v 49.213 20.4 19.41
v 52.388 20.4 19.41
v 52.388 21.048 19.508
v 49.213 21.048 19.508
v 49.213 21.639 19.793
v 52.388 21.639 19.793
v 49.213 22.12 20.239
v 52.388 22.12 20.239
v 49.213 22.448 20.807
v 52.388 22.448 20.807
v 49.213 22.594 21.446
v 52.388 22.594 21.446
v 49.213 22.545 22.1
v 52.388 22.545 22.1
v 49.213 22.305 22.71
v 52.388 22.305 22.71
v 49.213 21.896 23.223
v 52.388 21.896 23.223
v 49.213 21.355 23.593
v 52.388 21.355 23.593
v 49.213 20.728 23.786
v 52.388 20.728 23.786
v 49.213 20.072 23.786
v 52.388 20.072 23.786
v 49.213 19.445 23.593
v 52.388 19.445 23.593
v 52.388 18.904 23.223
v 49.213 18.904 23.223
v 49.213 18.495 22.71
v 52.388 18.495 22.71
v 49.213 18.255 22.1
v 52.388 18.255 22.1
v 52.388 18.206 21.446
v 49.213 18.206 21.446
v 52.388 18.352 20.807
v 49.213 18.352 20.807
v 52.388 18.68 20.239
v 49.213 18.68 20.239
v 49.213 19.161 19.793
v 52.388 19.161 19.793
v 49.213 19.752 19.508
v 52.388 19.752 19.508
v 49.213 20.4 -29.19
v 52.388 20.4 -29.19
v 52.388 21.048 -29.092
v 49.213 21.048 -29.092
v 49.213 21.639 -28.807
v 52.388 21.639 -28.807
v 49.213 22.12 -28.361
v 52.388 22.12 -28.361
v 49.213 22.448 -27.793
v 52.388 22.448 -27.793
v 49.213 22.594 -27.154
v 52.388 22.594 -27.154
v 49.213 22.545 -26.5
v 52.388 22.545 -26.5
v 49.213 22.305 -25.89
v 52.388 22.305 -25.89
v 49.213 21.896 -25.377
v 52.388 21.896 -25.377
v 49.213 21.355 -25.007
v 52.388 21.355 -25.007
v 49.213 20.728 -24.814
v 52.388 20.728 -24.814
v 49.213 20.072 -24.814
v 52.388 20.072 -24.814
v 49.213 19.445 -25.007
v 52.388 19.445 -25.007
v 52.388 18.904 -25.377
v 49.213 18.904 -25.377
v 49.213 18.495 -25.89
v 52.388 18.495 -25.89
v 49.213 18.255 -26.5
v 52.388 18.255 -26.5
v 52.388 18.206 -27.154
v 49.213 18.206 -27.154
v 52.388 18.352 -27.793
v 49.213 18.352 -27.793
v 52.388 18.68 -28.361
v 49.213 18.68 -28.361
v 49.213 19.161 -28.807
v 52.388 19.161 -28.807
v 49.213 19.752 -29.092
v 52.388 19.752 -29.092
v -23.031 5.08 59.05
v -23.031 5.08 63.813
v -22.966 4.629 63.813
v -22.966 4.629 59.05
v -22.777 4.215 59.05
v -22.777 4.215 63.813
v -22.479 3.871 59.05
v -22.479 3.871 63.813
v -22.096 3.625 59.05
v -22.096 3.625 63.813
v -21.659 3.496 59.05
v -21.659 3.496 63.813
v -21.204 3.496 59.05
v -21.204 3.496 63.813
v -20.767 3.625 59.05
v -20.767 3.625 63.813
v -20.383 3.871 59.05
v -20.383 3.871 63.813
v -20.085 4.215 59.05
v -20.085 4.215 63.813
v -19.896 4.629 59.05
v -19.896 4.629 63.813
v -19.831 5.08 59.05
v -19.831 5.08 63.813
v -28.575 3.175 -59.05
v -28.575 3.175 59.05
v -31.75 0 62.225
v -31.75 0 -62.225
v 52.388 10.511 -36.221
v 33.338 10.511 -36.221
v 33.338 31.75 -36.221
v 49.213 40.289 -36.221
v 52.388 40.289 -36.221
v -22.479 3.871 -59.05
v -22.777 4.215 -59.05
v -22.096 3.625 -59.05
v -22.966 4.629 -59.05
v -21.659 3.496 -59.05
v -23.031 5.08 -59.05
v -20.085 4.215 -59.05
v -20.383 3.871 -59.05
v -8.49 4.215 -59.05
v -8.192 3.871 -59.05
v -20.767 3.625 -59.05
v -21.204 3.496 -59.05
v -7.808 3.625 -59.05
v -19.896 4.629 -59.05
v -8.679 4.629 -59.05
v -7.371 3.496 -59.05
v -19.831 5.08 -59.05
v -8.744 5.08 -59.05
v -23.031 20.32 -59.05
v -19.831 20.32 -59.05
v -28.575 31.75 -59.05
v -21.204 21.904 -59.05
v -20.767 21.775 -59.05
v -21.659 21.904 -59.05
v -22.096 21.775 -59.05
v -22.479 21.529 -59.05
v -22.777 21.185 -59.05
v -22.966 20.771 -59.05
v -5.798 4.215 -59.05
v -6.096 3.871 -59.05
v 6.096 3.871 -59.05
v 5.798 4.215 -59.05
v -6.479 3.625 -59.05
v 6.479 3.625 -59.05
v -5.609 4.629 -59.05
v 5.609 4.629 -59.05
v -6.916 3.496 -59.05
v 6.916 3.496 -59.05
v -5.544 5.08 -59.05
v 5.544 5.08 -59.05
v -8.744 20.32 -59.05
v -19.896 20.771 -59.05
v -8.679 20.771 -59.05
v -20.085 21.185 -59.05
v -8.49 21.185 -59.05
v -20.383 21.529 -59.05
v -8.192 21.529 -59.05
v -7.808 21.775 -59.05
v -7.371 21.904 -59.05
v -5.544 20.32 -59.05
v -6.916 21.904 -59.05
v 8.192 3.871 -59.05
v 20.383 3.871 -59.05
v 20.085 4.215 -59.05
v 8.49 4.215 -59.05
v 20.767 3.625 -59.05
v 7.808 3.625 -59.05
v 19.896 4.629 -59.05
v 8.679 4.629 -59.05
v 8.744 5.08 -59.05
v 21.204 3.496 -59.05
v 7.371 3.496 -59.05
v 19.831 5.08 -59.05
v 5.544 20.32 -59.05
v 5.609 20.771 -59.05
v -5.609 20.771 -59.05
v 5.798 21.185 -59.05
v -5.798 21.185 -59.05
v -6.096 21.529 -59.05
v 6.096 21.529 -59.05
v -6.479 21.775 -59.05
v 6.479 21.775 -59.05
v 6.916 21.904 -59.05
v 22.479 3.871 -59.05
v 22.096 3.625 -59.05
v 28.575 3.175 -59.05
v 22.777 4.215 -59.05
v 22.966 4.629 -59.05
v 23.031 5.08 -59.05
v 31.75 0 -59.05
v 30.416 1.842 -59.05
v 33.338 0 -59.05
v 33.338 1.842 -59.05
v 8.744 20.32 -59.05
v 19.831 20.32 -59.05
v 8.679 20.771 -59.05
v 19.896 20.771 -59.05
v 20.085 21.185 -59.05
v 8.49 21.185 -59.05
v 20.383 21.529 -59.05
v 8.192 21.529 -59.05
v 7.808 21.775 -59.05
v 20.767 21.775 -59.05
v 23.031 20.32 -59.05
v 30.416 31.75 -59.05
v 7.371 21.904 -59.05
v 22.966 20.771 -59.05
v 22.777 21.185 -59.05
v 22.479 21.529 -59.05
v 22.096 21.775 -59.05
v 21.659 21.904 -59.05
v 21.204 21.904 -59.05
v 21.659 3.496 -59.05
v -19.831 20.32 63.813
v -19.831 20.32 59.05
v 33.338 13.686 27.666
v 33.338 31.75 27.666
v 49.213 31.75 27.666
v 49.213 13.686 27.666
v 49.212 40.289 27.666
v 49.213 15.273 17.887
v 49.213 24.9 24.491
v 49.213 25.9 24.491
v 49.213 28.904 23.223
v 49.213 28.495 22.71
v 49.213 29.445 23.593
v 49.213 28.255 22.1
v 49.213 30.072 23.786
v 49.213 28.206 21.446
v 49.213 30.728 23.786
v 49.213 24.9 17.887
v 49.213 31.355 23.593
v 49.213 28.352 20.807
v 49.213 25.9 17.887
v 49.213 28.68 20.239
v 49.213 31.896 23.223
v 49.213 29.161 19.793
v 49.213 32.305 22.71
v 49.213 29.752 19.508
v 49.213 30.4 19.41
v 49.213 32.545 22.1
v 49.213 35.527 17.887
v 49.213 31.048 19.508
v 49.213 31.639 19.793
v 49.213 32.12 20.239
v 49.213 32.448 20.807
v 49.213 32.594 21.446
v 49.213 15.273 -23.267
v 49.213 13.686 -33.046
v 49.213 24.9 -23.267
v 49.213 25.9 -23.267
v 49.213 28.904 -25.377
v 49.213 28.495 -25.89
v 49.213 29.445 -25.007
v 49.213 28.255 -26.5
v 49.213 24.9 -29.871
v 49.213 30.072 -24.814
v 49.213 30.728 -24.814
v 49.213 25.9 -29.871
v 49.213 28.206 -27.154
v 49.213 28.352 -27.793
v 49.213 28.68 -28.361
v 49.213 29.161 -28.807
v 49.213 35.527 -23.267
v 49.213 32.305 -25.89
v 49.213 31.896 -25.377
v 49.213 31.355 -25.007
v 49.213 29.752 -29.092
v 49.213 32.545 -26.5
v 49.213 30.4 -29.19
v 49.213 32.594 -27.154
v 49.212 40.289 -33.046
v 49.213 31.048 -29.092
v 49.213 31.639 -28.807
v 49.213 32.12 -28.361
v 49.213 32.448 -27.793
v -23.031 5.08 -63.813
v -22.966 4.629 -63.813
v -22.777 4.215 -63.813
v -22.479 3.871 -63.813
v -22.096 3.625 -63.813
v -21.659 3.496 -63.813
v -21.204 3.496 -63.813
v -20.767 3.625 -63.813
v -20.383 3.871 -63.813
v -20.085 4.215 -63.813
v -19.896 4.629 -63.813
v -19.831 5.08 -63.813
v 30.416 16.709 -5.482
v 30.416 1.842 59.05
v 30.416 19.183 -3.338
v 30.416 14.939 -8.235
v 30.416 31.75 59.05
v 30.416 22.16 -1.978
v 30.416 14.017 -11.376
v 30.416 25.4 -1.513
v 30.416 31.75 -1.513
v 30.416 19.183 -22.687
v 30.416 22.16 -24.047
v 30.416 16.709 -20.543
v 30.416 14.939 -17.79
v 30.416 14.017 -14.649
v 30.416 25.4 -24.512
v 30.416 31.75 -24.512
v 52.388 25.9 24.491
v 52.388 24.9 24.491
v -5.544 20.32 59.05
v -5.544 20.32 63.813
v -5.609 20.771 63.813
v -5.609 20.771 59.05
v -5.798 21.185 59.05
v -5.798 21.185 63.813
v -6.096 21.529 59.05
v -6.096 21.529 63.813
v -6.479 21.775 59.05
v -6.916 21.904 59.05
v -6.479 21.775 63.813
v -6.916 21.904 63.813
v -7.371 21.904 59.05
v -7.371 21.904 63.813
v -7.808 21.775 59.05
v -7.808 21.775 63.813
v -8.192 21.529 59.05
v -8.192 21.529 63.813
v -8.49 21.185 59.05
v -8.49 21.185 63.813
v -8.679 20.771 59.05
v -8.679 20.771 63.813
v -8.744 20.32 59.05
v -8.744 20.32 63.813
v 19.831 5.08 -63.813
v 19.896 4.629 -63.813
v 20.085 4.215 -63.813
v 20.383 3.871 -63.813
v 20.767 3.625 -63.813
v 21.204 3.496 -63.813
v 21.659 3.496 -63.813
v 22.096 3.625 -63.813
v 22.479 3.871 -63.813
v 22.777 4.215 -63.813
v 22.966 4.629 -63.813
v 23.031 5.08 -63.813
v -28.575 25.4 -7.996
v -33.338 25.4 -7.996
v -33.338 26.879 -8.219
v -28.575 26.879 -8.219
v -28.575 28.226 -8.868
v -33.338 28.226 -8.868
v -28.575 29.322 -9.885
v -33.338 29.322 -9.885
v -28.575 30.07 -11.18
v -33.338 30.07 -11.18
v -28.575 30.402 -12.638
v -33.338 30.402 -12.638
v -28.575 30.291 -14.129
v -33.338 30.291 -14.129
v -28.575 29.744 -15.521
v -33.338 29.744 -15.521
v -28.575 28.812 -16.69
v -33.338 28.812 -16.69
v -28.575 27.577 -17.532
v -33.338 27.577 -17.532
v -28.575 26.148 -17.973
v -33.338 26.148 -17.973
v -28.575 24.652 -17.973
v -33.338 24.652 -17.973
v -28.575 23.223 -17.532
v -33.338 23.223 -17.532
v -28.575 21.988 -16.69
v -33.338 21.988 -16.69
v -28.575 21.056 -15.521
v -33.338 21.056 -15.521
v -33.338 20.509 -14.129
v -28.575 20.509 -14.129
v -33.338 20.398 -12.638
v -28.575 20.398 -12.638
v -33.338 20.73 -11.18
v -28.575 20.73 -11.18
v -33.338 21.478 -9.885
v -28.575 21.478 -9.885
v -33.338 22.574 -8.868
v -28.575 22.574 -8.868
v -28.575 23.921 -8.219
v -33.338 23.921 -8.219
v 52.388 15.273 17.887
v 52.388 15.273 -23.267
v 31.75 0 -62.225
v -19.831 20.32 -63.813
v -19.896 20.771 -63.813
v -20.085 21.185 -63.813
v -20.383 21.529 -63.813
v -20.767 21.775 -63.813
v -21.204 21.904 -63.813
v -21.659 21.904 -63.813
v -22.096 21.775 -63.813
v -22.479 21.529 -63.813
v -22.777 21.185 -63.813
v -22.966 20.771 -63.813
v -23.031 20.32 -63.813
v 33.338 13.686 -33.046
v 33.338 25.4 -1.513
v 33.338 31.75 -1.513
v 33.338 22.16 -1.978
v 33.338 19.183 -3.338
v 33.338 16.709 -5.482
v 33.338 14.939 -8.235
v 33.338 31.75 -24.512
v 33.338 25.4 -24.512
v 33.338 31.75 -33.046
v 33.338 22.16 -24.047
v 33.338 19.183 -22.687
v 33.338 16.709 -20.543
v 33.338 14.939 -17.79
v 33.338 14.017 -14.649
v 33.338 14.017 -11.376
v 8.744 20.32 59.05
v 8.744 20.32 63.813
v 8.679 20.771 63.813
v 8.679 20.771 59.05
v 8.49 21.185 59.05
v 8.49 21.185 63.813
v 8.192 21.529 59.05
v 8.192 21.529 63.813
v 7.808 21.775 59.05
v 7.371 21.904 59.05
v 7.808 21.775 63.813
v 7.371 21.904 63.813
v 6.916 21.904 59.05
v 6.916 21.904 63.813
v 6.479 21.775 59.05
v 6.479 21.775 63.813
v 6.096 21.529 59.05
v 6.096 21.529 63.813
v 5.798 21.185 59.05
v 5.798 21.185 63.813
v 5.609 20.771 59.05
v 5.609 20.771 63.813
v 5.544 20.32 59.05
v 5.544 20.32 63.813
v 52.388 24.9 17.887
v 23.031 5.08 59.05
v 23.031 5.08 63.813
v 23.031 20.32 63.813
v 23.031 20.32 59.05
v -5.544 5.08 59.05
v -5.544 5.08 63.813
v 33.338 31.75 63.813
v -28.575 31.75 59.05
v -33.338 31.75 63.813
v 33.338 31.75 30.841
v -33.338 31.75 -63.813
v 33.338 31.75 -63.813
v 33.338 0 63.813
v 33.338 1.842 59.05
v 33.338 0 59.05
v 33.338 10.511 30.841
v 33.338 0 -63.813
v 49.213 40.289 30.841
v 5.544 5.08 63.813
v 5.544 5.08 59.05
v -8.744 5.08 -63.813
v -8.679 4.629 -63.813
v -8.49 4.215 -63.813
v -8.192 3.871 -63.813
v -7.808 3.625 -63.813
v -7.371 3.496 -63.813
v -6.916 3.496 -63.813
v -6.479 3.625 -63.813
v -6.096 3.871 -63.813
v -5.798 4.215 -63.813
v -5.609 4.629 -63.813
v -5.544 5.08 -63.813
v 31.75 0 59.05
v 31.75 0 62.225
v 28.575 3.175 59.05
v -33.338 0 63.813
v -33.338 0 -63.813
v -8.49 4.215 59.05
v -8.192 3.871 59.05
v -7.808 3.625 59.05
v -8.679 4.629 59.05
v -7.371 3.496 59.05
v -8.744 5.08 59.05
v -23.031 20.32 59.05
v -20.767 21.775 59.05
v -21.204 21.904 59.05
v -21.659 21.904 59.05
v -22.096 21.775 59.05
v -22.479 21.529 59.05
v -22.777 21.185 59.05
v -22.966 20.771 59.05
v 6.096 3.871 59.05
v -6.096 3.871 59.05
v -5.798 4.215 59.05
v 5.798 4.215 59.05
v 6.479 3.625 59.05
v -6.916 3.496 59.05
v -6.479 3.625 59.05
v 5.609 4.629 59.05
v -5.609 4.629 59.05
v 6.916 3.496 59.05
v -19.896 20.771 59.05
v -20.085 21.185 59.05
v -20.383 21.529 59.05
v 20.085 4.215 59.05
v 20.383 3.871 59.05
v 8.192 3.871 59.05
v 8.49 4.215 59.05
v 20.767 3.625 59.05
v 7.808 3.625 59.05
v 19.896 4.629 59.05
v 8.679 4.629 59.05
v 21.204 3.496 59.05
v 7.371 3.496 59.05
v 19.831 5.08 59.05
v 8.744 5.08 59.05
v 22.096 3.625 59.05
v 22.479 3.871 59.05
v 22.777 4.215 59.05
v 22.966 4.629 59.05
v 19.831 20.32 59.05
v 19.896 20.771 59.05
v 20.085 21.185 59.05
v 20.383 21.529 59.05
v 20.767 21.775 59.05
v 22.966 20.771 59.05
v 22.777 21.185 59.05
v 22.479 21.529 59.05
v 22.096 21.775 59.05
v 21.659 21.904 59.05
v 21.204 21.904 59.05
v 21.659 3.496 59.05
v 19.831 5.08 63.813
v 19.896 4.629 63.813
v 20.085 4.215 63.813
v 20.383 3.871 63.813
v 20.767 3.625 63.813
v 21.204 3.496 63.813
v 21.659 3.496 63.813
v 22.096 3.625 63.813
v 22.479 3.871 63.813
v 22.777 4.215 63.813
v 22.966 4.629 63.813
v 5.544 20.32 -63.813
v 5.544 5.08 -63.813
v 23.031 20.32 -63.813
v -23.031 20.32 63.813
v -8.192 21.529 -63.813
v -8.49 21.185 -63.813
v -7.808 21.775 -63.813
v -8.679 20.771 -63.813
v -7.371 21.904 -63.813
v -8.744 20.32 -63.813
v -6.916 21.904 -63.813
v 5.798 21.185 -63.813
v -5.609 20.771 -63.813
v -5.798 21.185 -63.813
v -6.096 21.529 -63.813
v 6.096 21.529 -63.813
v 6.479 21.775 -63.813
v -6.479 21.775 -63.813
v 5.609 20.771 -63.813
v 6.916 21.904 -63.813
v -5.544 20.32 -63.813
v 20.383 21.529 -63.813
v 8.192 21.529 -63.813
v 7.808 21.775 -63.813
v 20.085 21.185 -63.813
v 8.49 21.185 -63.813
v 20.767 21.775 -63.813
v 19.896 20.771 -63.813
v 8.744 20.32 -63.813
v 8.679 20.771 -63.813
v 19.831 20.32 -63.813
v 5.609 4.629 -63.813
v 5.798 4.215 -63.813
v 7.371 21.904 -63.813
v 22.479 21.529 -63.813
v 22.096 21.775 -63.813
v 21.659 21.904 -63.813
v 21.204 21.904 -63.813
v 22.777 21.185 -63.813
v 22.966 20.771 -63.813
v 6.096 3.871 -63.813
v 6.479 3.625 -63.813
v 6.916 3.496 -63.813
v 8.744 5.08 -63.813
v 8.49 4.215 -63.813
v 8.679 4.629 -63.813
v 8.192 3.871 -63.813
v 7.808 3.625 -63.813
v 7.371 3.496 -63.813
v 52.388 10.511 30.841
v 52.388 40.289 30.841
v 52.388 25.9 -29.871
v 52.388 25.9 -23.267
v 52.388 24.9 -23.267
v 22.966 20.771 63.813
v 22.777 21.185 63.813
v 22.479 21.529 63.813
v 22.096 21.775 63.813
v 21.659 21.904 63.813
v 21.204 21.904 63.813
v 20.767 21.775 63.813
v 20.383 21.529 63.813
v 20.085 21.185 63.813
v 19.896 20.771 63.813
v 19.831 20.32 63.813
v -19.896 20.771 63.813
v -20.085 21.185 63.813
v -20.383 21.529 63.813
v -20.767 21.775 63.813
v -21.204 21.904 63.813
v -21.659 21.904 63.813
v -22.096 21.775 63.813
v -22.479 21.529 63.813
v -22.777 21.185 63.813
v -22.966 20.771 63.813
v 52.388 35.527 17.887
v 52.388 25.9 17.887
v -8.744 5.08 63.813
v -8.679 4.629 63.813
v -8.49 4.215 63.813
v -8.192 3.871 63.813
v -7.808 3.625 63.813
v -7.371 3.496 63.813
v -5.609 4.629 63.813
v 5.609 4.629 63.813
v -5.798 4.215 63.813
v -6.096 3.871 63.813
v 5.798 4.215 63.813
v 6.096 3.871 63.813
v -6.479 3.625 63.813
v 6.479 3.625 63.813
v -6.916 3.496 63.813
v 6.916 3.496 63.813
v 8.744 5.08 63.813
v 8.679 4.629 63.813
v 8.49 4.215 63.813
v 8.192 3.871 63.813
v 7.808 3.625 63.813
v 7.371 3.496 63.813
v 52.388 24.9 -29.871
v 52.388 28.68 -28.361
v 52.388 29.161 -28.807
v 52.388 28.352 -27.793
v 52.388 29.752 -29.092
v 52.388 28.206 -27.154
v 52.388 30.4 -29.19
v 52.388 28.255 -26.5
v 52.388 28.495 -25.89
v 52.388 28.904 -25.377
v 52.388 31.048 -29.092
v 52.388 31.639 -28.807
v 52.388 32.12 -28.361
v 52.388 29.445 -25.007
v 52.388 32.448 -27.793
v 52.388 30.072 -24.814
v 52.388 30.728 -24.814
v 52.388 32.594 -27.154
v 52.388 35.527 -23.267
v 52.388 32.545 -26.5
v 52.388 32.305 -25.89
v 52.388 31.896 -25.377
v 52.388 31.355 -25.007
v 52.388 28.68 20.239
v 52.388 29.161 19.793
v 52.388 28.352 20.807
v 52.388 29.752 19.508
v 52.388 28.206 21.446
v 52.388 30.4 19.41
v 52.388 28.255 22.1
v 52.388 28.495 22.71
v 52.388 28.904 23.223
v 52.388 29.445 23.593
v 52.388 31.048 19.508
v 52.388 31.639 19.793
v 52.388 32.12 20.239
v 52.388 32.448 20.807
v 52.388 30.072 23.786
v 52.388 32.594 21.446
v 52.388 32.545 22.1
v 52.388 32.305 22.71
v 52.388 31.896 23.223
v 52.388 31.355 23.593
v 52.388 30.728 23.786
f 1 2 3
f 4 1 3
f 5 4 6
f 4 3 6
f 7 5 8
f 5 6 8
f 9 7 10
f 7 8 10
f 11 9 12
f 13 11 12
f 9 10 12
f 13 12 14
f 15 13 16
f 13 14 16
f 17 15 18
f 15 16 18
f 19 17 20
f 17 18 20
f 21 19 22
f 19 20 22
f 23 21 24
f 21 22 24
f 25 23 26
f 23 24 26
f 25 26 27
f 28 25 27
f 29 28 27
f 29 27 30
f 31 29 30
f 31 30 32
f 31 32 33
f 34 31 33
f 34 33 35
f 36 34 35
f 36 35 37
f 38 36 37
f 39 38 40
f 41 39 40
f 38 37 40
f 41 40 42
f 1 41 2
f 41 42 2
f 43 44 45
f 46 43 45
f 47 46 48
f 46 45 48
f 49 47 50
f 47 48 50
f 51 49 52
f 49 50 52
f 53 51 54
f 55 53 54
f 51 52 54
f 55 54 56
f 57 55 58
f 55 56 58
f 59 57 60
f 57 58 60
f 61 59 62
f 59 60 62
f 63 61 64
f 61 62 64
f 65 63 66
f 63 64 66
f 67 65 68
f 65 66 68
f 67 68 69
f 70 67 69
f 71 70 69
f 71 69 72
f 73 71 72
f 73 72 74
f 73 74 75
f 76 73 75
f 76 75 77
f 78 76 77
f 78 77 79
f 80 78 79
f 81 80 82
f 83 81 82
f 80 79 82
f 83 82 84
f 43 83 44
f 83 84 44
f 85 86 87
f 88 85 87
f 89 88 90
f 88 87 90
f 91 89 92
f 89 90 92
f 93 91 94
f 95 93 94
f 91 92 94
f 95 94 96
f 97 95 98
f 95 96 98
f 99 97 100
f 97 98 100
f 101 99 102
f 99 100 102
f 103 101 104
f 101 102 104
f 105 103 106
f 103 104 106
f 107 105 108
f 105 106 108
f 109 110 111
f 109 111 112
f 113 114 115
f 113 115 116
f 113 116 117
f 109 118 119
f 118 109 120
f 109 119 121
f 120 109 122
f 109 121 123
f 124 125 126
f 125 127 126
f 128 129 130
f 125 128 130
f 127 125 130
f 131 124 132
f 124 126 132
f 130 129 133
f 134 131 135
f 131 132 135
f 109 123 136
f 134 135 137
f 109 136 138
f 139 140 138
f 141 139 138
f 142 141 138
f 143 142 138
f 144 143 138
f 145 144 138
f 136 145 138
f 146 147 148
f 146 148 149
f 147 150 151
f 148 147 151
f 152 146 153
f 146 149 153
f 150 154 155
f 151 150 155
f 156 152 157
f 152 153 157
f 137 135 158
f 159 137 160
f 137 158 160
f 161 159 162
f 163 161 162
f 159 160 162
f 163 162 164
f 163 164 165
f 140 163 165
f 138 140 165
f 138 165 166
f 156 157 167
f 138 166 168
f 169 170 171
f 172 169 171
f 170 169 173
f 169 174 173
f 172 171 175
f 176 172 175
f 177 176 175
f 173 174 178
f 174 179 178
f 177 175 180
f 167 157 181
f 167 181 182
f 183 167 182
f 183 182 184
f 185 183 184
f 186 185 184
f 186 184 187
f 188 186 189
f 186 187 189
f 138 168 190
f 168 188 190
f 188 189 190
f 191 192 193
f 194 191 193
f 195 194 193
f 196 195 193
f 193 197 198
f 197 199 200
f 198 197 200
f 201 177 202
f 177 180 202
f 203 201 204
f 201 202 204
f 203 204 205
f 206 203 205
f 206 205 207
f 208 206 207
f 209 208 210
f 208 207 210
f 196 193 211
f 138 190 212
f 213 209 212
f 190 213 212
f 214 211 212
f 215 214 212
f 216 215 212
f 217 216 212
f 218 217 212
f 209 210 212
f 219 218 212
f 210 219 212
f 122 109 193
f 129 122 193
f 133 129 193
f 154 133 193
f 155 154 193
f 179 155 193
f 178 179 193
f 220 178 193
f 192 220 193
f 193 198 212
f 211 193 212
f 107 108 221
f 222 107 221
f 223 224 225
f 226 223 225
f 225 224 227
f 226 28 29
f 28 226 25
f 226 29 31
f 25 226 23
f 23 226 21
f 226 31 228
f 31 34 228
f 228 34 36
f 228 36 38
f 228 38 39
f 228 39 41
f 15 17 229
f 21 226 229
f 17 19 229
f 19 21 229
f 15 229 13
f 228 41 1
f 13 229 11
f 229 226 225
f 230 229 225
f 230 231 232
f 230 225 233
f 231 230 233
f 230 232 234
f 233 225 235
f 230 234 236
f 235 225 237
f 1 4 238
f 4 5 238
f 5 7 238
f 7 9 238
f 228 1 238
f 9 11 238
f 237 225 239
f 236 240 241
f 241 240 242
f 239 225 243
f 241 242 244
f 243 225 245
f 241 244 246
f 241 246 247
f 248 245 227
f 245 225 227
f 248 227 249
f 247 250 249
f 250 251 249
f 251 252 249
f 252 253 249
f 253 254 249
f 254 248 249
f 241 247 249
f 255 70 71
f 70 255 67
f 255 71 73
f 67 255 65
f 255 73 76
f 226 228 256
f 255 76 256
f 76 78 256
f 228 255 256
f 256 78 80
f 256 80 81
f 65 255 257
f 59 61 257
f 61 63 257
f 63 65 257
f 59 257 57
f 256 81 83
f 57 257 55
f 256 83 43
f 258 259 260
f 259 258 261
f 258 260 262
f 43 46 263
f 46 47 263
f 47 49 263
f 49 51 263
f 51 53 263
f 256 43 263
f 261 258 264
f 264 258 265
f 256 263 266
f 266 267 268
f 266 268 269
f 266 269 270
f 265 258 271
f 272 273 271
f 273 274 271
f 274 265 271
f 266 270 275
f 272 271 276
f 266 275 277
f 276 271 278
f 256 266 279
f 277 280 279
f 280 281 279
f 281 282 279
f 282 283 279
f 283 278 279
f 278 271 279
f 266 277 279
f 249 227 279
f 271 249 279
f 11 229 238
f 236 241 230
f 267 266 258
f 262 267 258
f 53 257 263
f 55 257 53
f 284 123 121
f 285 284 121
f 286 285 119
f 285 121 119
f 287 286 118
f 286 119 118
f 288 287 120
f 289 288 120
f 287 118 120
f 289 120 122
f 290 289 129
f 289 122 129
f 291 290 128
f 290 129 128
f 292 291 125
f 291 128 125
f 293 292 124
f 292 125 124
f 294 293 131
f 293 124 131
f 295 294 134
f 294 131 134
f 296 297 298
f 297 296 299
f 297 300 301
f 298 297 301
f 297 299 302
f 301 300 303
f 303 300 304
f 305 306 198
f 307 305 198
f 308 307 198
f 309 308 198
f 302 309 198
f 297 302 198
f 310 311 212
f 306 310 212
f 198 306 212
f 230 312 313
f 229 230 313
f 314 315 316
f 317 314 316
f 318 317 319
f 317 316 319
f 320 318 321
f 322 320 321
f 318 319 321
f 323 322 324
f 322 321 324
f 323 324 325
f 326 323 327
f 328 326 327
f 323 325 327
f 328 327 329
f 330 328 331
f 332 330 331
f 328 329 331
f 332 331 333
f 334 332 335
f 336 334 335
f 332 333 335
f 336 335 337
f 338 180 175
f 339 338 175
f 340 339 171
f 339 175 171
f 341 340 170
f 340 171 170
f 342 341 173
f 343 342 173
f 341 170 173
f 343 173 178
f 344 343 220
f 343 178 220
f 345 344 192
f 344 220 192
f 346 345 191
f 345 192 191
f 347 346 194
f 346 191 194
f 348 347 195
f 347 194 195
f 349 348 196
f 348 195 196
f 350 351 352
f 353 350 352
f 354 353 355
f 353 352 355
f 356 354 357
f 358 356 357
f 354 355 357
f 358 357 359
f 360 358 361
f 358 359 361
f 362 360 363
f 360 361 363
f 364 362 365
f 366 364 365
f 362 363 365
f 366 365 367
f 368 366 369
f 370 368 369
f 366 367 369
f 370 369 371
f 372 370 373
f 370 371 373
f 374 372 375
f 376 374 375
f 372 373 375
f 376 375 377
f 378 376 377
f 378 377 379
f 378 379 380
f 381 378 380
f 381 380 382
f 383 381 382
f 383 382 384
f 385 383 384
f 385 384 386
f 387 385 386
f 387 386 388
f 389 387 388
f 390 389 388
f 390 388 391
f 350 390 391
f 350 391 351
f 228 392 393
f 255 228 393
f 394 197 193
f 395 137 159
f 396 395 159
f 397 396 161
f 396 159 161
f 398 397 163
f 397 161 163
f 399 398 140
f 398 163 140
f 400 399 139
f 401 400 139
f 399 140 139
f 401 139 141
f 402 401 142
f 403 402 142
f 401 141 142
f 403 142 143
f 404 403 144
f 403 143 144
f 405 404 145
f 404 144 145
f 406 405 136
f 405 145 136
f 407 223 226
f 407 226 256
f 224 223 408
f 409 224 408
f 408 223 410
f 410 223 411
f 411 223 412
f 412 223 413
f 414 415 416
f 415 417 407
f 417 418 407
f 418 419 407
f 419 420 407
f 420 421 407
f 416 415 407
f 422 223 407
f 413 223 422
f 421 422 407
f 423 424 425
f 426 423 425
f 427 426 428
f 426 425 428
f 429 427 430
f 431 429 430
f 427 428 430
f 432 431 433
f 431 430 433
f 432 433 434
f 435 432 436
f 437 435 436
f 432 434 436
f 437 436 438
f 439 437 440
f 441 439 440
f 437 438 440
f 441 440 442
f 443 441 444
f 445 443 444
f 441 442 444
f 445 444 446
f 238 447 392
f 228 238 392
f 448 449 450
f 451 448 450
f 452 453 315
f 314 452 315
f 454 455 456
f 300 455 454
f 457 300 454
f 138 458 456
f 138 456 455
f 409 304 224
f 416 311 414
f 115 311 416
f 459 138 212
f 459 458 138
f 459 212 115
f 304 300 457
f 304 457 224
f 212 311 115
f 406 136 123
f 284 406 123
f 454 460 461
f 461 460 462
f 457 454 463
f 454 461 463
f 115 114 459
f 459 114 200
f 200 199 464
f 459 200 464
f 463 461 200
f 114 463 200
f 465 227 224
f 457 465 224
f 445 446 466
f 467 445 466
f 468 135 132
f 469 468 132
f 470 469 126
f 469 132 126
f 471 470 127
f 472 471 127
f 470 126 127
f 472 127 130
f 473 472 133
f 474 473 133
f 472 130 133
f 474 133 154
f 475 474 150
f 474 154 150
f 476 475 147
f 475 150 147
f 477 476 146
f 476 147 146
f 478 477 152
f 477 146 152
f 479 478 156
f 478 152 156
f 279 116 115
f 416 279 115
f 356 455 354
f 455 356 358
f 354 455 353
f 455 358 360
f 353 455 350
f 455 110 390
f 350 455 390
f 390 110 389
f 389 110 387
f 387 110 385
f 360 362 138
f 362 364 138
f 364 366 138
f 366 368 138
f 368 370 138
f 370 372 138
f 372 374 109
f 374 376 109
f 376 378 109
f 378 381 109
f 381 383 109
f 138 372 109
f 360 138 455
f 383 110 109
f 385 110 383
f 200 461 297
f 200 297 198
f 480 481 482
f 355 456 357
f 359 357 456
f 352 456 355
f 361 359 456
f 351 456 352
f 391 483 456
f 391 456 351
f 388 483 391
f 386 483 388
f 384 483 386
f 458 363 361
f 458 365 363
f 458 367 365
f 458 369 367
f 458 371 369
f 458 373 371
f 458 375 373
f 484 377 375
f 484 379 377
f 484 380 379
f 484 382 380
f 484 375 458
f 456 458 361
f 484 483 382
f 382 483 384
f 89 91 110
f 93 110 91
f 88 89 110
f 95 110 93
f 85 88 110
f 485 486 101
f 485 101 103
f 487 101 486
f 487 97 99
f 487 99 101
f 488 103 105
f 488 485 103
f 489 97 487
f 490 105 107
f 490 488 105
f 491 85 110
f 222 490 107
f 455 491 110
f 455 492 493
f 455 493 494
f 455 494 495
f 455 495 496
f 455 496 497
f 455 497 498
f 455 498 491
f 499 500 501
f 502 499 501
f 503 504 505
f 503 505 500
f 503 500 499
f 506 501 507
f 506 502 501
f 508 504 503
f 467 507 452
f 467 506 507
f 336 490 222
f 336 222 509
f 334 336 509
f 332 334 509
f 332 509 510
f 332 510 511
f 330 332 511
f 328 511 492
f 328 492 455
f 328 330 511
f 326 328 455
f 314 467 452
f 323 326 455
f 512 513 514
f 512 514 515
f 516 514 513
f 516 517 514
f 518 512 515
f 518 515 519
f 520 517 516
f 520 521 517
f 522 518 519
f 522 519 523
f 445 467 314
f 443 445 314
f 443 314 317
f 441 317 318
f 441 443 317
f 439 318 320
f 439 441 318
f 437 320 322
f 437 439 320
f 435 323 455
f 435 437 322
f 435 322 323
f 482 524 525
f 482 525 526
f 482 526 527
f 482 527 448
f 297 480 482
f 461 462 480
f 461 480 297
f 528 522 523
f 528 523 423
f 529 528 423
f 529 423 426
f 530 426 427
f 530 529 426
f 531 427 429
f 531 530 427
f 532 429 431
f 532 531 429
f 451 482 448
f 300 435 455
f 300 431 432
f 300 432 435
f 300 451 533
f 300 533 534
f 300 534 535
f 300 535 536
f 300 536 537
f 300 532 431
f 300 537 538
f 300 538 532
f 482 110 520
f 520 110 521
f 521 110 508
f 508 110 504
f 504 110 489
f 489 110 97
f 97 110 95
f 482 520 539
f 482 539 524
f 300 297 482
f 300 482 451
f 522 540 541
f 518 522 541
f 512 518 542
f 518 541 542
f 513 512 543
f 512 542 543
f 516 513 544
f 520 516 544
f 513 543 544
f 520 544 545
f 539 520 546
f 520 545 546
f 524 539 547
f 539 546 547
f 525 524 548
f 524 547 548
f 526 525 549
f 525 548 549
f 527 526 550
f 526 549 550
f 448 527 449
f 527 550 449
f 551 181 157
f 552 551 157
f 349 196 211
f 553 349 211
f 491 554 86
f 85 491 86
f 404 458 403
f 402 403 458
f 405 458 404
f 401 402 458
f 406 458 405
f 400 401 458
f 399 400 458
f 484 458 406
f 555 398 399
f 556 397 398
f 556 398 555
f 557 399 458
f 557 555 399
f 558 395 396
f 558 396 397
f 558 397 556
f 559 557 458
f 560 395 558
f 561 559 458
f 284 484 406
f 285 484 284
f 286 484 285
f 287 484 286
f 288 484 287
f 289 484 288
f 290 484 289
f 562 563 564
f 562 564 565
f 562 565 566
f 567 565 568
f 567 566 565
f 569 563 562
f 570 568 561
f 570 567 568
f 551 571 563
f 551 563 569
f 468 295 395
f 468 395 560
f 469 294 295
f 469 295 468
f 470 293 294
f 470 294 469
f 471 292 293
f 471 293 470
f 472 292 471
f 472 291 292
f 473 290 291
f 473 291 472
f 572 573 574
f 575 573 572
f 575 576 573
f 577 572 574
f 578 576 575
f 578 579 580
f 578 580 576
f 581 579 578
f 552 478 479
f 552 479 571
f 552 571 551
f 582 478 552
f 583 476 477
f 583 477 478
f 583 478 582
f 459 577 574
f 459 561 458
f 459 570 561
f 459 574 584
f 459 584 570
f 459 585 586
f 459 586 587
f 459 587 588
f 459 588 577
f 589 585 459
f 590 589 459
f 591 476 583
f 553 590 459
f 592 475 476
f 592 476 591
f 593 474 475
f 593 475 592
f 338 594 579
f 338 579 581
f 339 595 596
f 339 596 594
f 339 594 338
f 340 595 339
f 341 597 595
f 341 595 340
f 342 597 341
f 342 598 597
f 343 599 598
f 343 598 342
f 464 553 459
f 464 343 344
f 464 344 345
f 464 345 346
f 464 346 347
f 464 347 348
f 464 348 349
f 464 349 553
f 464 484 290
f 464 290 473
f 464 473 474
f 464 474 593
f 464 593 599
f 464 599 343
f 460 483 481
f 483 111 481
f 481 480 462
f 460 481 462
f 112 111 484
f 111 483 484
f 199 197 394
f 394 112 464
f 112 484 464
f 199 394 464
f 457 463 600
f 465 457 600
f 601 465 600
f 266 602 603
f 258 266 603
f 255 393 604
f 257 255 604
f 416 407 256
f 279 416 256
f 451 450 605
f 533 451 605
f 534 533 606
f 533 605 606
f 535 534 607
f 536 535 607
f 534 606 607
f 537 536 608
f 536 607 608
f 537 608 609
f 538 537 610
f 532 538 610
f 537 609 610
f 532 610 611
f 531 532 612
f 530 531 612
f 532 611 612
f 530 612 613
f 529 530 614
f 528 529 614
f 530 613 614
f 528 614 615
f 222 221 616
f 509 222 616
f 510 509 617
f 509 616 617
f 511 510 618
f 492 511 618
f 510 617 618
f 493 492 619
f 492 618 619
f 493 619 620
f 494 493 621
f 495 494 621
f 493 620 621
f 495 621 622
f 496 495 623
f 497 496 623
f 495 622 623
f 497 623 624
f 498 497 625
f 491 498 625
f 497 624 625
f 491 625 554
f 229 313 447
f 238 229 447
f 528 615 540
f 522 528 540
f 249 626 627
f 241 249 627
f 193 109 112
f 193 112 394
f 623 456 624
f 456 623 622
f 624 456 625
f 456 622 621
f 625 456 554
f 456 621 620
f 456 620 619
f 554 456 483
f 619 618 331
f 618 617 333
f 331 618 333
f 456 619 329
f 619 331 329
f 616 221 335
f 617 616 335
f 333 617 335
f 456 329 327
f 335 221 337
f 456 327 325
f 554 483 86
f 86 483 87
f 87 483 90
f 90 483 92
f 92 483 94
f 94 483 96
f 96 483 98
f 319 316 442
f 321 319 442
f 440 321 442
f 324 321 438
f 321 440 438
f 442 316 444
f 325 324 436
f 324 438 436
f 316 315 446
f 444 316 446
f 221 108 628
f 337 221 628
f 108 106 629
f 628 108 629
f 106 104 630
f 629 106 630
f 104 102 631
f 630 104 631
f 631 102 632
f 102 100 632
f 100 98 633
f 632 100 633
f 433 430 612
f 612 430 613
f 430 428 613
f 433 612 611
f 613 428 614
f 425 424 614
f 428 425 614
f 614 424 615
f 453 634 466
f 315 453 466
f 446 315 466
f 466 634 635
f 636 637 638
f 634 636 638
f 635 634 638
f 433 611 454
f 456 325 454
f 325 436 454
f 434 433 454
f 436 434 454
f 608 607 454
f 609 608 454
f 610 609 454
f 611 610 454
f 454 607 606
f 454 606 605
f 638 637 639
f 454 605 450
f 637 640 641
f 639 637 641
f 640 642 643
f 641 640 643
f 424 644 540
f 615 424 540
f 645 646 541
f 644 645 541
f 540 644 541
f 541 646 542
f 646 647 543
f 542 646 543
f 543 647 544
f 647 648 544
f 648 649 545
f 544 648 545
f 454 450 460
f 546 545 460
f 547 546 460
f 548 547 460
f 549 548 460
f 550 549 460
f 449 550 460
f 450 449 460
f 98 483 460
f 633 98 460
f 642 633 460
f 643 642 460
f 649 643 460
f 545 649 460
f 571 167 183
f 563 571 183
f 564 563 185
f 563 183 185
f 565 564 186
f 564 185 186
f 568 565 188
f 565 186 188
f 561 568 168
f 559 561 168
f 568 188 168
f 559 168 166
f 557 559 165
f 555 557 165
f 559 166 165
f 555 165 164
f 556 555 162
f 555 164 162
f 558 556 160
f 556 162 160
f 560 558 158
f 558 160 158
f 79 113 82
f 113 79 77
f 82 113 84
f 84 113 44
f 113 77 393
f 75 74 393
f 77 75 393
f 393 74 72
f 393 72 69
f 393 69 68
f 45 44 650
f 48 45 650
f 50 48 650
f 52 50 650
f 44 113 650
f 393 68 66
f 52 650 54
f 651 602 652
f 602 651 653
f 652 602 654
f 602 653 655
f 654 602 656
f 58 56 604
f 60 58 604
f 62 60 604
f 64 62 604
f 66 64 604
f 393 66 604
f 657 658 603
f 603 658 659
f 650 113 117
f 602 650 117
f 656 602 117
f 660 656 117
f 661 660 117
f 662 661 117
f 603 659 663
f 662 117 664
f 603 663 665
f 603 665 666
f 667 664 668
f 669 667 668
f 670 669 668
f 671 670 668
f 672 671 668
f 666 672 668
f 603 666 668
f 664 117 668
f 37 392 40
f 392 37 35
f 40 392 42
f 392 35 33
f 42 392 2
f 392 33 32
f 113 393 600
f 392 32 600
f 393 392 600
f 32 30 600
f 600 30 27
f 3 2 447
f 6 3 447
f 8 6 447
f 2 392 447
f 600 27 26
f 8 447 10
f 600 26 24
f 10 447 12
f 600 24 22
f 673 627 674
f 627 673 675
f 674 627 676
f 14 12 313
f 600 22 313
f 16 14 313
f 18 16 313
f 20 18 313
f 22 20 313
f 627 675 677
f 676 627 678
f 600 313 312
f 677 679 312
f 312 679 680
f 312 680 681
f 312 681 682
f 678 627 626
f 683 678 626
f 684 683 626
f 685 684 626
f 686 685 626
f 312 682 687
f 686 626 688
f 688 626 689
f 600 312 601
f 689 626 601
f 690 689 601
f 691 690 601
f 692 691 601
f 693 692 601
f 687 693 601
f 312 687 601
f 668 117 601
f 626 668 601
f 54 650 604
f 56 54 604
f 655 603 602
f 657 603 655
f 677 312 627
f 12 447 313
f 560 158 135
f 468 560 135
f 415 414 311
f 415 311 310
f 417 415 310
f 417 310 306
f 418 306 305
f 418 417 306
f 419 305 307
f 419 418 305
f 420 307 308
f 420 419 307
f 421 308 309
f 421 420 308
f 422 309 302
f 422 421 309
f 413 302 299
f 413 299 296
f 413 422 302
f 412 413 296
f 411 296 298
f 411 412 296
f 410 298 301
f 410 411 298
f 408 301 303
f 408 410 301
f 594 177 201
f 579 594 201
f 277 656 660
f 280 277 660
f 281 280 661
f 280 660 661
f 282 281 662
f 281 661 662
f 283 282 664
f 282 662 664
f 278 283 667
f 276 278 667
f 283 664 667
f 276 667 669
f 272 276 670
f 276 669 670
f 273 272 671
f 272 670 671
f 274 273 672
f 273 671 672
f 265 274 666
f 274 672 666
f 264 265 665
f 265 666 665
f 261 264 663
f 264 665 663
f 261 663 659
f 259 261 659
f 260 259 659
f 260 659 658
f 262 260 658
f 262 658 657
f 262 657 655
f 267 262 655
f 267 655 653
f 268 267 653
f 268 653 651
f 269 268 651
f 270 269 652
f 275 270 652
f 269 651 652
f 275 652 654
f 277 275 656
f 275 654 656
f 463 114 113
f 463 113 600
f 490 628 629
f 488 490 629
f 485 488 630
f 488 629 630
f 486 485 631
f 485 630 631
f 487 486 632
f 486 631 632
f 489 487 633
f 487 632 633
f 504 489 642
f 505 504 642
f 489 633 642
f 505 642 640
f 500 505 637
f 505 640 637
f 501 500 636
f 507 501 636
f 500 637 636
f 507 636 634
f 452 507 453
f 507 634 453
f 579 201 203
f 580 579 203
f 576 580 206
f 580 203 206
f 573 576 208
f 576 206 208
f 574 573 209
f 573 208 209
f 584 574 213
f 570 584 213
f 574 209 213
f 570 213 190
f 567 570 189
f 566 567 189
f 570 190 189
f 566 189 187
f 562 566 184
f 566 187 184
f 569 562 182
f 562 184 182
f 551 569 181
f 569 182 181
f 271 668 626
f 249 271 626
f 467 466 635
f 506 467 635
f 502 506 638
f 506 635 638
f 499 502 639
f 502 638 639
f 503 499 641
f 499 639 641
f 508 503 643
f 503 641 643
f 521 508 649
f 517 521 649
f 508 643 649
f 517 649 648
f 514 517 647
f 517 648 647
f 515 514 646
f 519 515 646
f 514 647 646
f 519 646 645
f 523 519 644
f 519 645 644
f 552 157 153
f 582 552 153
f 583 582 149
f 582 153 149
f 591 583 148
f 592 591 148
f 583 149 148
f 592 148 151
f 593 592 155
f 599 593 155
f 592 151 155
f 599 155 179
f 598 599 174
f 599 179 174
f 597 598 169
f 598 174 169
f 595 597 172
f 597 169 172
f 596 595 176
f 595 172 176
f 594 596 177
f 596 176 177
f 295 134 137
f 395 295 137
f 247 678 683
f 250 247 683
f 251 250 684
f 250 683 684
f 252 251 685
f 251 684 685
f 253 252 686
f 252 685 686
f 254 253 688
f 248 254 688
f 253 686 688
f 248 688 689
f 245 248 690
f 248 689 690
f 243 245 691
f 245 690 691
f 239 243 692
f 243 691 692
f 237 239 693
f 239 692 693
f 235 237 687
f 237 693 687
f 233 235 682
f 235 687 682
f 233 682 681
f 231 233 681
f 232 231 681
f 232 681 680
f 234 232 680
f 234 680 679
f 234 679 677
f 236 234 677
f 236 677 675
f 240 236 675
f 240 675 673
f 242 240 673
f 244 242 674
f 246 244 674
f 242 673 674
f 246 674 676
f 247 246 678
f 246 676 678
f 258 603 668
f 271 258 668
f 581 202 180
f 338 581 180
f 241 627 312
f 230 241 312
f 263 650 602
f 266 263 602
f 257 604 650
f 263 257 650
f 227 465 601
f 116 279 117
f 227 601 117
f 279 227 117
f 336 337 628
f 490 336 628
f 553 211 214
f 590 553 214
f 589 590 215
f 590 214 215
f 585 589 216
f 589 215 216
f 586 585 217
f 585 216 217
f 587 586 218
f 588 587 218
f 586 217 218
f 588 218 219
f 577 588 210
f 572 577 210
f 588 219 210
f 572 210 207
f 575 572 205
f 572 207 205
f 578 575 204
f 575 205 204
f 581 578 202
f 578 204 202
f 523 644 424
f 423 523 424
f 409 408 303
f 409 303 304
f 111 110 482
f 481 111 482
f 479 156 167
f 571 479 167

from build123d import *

# Parameters (mm, degrees)
SKETCH4_W                = 66.675
SKETCH4_H                = 127.62500002
SKETCH4_W_2              = 57.15
SKETCH4_H_2              = 118.10000002
BOSS_EXTRUDE1_DEPTH      = 19.05
BOSS_EXTRUDE2_START      = 19.05
SKETCH5_W                = 66.675
SKETCH5_H                = 127.62500002
BOSS_EXTRUDE2_DEPTH      = 12.7
FILLET1_SIZE             = 3.175
SKETCH14_W               = 57.15
SKETCH14_H               = 118.10000002
CUT_EXTRUDE8_DEPTH       = 12.7
SKETCH26_W               = 1.8415
SKETCH26_H               = 118.10000002
CUT_EXTRUDE11_DEPTH      = 79.685999795
CUT_EXTRUDE12_REACH      = 99.599
SKETCH27_W               = 118.10000002
SKETCH27_H               = 1.8415
SKETCH30_R               = 5.0165
CUT_EXTRUDE13_DEPTH      = 98.59945329
CUT_EXTRUDE16_DEPTH      = 2.921
BOSS_EXTRUDE4_DEPTH      = 19.05
SKETCH34_W               = 67.061999988
SKETCH34_H               = 29.778999878
BOSS_EXTRUDE5_DEPTH      = 3.175
CUT_EXTRUDE17_START      = 19.05
SKETCH32_R               = 2.200000045
CUT_EXTRUDE17_DEPTH      = 3.175
BOSS_EXTRUDE6_DEPTH      = 3.175
BOSS_EXTRUDE8_START      = -63.887
BOSS_EXTRUDE8_DEPTH      = 3.175
CUT_EXTRUDE18_DEPTH      = 144.721378339
CUT_EXTRUDE18_DEPTH_BACK = 144.721378339


with BuildPart() as part:
    # Sketch4 → Boss-Extrude1 (new body)
    with BuildSketch(Plane(origin=(0, 0, 0), x_dir=(1, 0, 0), z_dir=(0, 1, 0))):
        Rectangle(SKETCH4_W, SKETCH4_H)
        Rectangle(SKETCH4_W_2, SKETCH4_H_2, mode=Mode.SUBTRACT)
    extrude(amount=BOSS_EXTRUDE1_DEPTH)

    # Sketch5 → Boss-Extrude2 (add)
    with BuildSketch(Plane(origin=(0, 0, 0), x_dir=(1, 0, 0), z_dir=(0, 1, 0)).offset(BOSS_EXTRUDE2_START)):
        Rectangle(SKETCH5_W, SKETCH5_H)
    extrude(amount=BOSS_EXTRUDE2_DEPTH)

    # Fillet1
    fillet1_edges = [part.edges().sort_by_distance(p)[0] for p in [
        (-28.575, 0, 0),
        (0, 0, 59.05000001),
        (28.575, 0, 0),
        (0, 0, -59.05000001),
    ]]
    chamfer(fillet1_edges, length=FILLET1_SIZE)

    # Sketch14 → Cut-Extrude8 (cut)
    with BuildSketch(Plane.XZ.offset(-19.05)):
        Rectangle(SKETCH14_W, SKETCH14_H)
    extrude(amount=-CUT_EXTRUDE8_DEPTH, mode=Mode.SUBTRACT)

    # Sketch26 → Cut-Extrude11 (cut, through all)
    with BuildSketch(Plane(origin=(0, 31.75, 0), x_dir=(1, 0, 0), z_dir=(0, 1, 0))):
        with Locations((29.49575, 0)):
            Rectangle(SKETCH26_W, SKETCH26_H)
    extrude(amount=-CUT_EXTRUDE11_DEPTH, mode=Mode.SUBTRACT)

    # Sketch27 → Cut-Extrude12 (cut, up to next)
    with BuildSketch(Plane(origin=(33.3375, 0, 0), x_dir=(0, 0, -1), z_dir=(1, 0, 0)), mode=Mode.PRIVATE) as cut_extrude12_sk1:
        with Locations((0, 0.92075)):
            Rectangle(SKETCH27_W, SKETCH27_H)
    cut_extrude12_tool1 = extrude(cut_extrude12_sk1.sketch, amount=-CUT_EXTRUDE12_REACH, mode=Mode.PRIVATE) & part.part
    add(cut_extrude12_tool1.solids().sort_by_distance((33.3375, 0.92075, 0))[0], mode=Mode.SUBTRACT)

    # Sketch30 → Cut-Extrude13 (cut, through all)
    with BuildSketch(Plane.ZY.offset(33.3375)):
        with Locations((-13.01250001, 25.4)):
            Circle(SKETCH30_R)
    extrude(amount=-CUT_EXTRUDE13_DEPTH, mode=Mode.SUBTRACT)

    # Sketch31 → Cut-Extrude16 (cut)
    with BuildSketch(Plane(origin=(33.3375, 0, 0), x_dir=(0, 0, -1), z_dir=(1, 0, 0))):
        with BuildLine():
            Line((1.512500023, 25.4), (1.512500023, 31.75))
            Line((1.512500023, 31.75), (24.512499997, 31.75))
            Line((24.512499997, 31.75), (24.512499997, 25.4))
            ThreePointArc((24.512499997, 25.4), (13.01250001, 13.900000013), (1.512500023, 25.4))
        make_face()
    extrude(amount=-CUT_EXTRUDE16_DEPTH, mode=Mode.SUBTRACT)

    # Sketch33 → Boss-Extrude4 (add)
    with BuildSketch(Plane(origin=(33.3375, 0, 0), x_dir=(0, 0, -1), z_dir=(1, 0, 0))):
        Polygon((-27.666499912, 31.75), (-27.666499912, 13.685500061), (33.045500076, 13.685500061), (33.045500076, 31.75), (36.220500076, 31.75), (36.220500076, 10.510500061), (-30.841499912, 10.510500061), (-30.841499912, 31.75), align=None)
    extrude(amount=BOSS_EXTRUDE4_DEPTH)

    # Sketch34 → Boss-Extrude5 (add)
    with BuildSketch(Plane(origin=(52.3875, 0, 0), x_dir=(0, 0, -1), z_dir=(1, 0, 0))):
        with Locations((2.689500082, 25.4)):
            Rectangle(SKETCH34_W, SKETCH34_H)
    extrude(amount=-BOSS_EXTRUDE5_DEPTH)

    # Sketch32 → Cut-Extrude17 (cut)
    with BuildSketch(Plane(origin=(33.3375, 0, 0), x_dir=(0, 0, -1), z_dir=(1, 0, 0)).offset(CUT_EXTRUDE17_START)):
        with Locations((26.989500123, 30.400000033)):
            Circle(SKETCH32_R)
        with Locations((26.989500123, 20.399999967)):
            Circle(SKETCH32_R)
        with Locations((-21.610499959, 30.400000033)):
            Circle(SKETCH32_R)
        with Locations((-21.610499959, 20.399999967)):
            Circle(SKETCH32_R)
        Polygon((23.266500076, 15.273000061), (23.266500076, 24.9), (29.870500076, 24.9), (29.870500076, 25.9), (23.266500076, 25.9), (23.266500076, 35.526999939), (-17.887499912, 35.526999939), (-17.887499912, 25.9), (-24.491499912, 25.9), (-24.491499912, 24.9), (-17.887499912, 24.9), (-17.887499912, 15.273000061), align=None)
    extrude(amount=-CUT_EXTRUDE17_DEPTH, mode=Mode.SUBTRACT)

    # Sketch35 → Boss-Extrude6 (add)
    with BuildSketch(Plane(origin=(0, 0, -36.220500076), x_dir=(-1, 0, 0), z_dir=(0, 0, -1))):
        Polygon((-49.2125, 40.289499939), (-33.3375, 31.75), (-49.2125, 31.75), align=None)
    extrude(amount=-BOSS_EXTRUDE6_DEPTH)

    # Sketch35<2> → Boss-Extrude8 (add)
    with BuildSketch(Plane(origin=(0, 0, -36.220500076), x_dir=(-1, 0, 0), z_dir=(0, 0, -1)).offset(BOSS_EXTRUDE8_START)):
        Polygon((-49.2125, 40.289499939), (-33.3375, 31.75), (-49.2125, 31.75), align=None)
    extrude(amount=-BOSS_EXTRUDE8_DEPTH)

    # Sketch40 → Cut-Extrude18 (cut, two sides: drawn at the far end of the back side and taken through both)
    with BuildSketch(Plane(origin=(0, 0, -63.81250001), x_dir=(-1, 0, 0), z_dir=(0, 0, -1)).offset(-CUT_EXTRUDE18_DEPTH_BACK)):
        with BuildLine():
            Line((-5.543749898, 20.32), (-5.543749898, 5.08))
            ThreePointArc((-5.543749898, 5.08), (-7.14375, 3.479999898), (-8.743750102, 5.08))
            Line((-8.743750102, 5.08), (-8.743750102, 20.32))
            ThreePointArc((-8.743750102, 20.32), (-7.14375, 21.920000102), (-5.543749898, 20.32))
        make_face()
        with BuildLine():
            Line((8.743750102, 20.32), (8.743750102, 5.08))
            ThreePointArc((8.743750102, 5.08), (7.14375, 3.479999898), (5.543749898, 5.08))
            Line((5.543749898, 5.08), (5.543749898, 20.32))
            ThreePointArc((5.543749898, 20.32), (7.14375, 21.920000102), (8.743750102, 20.32))
        make_face()
        with BuildLine():
            Line((23.031250102, 20.32), (23.031250102, 5.08))
            ThreePointArc((23.031250102, 5.08), (21.43125, 3.479999898), (19.831249898, 5.08))
            Line((19.831249898, 5.08), (19.831249898, 20.32))
            ThreePointArc((19.831249898, 20.32), (21.43125, 21.920000102), (23.031250102, 20.32))
        make_face()
        with BuildLine():
            Line((-19.831249898, 20.32), (-19.831249898, 5.08))
            ThreePointArc((-19.831249898, 5.08), (-21.43125, 3.479999898), (-23.031250102, 5.08))
            Line((-23.031250102, 5.08), (-23.031250102, 20.32))
            ThreePointArc((-23.031250102, 20.32), (-21.43125, 21.920000102), (-19.831249898, 20.32))
        make_face()
    extrude(amount=CUT_EXTRUDE18_DEPTH + CUT_EXTRUDE18_DEPTH_BACK, mode=Mode.SUBTRACT)


solid = part.part
